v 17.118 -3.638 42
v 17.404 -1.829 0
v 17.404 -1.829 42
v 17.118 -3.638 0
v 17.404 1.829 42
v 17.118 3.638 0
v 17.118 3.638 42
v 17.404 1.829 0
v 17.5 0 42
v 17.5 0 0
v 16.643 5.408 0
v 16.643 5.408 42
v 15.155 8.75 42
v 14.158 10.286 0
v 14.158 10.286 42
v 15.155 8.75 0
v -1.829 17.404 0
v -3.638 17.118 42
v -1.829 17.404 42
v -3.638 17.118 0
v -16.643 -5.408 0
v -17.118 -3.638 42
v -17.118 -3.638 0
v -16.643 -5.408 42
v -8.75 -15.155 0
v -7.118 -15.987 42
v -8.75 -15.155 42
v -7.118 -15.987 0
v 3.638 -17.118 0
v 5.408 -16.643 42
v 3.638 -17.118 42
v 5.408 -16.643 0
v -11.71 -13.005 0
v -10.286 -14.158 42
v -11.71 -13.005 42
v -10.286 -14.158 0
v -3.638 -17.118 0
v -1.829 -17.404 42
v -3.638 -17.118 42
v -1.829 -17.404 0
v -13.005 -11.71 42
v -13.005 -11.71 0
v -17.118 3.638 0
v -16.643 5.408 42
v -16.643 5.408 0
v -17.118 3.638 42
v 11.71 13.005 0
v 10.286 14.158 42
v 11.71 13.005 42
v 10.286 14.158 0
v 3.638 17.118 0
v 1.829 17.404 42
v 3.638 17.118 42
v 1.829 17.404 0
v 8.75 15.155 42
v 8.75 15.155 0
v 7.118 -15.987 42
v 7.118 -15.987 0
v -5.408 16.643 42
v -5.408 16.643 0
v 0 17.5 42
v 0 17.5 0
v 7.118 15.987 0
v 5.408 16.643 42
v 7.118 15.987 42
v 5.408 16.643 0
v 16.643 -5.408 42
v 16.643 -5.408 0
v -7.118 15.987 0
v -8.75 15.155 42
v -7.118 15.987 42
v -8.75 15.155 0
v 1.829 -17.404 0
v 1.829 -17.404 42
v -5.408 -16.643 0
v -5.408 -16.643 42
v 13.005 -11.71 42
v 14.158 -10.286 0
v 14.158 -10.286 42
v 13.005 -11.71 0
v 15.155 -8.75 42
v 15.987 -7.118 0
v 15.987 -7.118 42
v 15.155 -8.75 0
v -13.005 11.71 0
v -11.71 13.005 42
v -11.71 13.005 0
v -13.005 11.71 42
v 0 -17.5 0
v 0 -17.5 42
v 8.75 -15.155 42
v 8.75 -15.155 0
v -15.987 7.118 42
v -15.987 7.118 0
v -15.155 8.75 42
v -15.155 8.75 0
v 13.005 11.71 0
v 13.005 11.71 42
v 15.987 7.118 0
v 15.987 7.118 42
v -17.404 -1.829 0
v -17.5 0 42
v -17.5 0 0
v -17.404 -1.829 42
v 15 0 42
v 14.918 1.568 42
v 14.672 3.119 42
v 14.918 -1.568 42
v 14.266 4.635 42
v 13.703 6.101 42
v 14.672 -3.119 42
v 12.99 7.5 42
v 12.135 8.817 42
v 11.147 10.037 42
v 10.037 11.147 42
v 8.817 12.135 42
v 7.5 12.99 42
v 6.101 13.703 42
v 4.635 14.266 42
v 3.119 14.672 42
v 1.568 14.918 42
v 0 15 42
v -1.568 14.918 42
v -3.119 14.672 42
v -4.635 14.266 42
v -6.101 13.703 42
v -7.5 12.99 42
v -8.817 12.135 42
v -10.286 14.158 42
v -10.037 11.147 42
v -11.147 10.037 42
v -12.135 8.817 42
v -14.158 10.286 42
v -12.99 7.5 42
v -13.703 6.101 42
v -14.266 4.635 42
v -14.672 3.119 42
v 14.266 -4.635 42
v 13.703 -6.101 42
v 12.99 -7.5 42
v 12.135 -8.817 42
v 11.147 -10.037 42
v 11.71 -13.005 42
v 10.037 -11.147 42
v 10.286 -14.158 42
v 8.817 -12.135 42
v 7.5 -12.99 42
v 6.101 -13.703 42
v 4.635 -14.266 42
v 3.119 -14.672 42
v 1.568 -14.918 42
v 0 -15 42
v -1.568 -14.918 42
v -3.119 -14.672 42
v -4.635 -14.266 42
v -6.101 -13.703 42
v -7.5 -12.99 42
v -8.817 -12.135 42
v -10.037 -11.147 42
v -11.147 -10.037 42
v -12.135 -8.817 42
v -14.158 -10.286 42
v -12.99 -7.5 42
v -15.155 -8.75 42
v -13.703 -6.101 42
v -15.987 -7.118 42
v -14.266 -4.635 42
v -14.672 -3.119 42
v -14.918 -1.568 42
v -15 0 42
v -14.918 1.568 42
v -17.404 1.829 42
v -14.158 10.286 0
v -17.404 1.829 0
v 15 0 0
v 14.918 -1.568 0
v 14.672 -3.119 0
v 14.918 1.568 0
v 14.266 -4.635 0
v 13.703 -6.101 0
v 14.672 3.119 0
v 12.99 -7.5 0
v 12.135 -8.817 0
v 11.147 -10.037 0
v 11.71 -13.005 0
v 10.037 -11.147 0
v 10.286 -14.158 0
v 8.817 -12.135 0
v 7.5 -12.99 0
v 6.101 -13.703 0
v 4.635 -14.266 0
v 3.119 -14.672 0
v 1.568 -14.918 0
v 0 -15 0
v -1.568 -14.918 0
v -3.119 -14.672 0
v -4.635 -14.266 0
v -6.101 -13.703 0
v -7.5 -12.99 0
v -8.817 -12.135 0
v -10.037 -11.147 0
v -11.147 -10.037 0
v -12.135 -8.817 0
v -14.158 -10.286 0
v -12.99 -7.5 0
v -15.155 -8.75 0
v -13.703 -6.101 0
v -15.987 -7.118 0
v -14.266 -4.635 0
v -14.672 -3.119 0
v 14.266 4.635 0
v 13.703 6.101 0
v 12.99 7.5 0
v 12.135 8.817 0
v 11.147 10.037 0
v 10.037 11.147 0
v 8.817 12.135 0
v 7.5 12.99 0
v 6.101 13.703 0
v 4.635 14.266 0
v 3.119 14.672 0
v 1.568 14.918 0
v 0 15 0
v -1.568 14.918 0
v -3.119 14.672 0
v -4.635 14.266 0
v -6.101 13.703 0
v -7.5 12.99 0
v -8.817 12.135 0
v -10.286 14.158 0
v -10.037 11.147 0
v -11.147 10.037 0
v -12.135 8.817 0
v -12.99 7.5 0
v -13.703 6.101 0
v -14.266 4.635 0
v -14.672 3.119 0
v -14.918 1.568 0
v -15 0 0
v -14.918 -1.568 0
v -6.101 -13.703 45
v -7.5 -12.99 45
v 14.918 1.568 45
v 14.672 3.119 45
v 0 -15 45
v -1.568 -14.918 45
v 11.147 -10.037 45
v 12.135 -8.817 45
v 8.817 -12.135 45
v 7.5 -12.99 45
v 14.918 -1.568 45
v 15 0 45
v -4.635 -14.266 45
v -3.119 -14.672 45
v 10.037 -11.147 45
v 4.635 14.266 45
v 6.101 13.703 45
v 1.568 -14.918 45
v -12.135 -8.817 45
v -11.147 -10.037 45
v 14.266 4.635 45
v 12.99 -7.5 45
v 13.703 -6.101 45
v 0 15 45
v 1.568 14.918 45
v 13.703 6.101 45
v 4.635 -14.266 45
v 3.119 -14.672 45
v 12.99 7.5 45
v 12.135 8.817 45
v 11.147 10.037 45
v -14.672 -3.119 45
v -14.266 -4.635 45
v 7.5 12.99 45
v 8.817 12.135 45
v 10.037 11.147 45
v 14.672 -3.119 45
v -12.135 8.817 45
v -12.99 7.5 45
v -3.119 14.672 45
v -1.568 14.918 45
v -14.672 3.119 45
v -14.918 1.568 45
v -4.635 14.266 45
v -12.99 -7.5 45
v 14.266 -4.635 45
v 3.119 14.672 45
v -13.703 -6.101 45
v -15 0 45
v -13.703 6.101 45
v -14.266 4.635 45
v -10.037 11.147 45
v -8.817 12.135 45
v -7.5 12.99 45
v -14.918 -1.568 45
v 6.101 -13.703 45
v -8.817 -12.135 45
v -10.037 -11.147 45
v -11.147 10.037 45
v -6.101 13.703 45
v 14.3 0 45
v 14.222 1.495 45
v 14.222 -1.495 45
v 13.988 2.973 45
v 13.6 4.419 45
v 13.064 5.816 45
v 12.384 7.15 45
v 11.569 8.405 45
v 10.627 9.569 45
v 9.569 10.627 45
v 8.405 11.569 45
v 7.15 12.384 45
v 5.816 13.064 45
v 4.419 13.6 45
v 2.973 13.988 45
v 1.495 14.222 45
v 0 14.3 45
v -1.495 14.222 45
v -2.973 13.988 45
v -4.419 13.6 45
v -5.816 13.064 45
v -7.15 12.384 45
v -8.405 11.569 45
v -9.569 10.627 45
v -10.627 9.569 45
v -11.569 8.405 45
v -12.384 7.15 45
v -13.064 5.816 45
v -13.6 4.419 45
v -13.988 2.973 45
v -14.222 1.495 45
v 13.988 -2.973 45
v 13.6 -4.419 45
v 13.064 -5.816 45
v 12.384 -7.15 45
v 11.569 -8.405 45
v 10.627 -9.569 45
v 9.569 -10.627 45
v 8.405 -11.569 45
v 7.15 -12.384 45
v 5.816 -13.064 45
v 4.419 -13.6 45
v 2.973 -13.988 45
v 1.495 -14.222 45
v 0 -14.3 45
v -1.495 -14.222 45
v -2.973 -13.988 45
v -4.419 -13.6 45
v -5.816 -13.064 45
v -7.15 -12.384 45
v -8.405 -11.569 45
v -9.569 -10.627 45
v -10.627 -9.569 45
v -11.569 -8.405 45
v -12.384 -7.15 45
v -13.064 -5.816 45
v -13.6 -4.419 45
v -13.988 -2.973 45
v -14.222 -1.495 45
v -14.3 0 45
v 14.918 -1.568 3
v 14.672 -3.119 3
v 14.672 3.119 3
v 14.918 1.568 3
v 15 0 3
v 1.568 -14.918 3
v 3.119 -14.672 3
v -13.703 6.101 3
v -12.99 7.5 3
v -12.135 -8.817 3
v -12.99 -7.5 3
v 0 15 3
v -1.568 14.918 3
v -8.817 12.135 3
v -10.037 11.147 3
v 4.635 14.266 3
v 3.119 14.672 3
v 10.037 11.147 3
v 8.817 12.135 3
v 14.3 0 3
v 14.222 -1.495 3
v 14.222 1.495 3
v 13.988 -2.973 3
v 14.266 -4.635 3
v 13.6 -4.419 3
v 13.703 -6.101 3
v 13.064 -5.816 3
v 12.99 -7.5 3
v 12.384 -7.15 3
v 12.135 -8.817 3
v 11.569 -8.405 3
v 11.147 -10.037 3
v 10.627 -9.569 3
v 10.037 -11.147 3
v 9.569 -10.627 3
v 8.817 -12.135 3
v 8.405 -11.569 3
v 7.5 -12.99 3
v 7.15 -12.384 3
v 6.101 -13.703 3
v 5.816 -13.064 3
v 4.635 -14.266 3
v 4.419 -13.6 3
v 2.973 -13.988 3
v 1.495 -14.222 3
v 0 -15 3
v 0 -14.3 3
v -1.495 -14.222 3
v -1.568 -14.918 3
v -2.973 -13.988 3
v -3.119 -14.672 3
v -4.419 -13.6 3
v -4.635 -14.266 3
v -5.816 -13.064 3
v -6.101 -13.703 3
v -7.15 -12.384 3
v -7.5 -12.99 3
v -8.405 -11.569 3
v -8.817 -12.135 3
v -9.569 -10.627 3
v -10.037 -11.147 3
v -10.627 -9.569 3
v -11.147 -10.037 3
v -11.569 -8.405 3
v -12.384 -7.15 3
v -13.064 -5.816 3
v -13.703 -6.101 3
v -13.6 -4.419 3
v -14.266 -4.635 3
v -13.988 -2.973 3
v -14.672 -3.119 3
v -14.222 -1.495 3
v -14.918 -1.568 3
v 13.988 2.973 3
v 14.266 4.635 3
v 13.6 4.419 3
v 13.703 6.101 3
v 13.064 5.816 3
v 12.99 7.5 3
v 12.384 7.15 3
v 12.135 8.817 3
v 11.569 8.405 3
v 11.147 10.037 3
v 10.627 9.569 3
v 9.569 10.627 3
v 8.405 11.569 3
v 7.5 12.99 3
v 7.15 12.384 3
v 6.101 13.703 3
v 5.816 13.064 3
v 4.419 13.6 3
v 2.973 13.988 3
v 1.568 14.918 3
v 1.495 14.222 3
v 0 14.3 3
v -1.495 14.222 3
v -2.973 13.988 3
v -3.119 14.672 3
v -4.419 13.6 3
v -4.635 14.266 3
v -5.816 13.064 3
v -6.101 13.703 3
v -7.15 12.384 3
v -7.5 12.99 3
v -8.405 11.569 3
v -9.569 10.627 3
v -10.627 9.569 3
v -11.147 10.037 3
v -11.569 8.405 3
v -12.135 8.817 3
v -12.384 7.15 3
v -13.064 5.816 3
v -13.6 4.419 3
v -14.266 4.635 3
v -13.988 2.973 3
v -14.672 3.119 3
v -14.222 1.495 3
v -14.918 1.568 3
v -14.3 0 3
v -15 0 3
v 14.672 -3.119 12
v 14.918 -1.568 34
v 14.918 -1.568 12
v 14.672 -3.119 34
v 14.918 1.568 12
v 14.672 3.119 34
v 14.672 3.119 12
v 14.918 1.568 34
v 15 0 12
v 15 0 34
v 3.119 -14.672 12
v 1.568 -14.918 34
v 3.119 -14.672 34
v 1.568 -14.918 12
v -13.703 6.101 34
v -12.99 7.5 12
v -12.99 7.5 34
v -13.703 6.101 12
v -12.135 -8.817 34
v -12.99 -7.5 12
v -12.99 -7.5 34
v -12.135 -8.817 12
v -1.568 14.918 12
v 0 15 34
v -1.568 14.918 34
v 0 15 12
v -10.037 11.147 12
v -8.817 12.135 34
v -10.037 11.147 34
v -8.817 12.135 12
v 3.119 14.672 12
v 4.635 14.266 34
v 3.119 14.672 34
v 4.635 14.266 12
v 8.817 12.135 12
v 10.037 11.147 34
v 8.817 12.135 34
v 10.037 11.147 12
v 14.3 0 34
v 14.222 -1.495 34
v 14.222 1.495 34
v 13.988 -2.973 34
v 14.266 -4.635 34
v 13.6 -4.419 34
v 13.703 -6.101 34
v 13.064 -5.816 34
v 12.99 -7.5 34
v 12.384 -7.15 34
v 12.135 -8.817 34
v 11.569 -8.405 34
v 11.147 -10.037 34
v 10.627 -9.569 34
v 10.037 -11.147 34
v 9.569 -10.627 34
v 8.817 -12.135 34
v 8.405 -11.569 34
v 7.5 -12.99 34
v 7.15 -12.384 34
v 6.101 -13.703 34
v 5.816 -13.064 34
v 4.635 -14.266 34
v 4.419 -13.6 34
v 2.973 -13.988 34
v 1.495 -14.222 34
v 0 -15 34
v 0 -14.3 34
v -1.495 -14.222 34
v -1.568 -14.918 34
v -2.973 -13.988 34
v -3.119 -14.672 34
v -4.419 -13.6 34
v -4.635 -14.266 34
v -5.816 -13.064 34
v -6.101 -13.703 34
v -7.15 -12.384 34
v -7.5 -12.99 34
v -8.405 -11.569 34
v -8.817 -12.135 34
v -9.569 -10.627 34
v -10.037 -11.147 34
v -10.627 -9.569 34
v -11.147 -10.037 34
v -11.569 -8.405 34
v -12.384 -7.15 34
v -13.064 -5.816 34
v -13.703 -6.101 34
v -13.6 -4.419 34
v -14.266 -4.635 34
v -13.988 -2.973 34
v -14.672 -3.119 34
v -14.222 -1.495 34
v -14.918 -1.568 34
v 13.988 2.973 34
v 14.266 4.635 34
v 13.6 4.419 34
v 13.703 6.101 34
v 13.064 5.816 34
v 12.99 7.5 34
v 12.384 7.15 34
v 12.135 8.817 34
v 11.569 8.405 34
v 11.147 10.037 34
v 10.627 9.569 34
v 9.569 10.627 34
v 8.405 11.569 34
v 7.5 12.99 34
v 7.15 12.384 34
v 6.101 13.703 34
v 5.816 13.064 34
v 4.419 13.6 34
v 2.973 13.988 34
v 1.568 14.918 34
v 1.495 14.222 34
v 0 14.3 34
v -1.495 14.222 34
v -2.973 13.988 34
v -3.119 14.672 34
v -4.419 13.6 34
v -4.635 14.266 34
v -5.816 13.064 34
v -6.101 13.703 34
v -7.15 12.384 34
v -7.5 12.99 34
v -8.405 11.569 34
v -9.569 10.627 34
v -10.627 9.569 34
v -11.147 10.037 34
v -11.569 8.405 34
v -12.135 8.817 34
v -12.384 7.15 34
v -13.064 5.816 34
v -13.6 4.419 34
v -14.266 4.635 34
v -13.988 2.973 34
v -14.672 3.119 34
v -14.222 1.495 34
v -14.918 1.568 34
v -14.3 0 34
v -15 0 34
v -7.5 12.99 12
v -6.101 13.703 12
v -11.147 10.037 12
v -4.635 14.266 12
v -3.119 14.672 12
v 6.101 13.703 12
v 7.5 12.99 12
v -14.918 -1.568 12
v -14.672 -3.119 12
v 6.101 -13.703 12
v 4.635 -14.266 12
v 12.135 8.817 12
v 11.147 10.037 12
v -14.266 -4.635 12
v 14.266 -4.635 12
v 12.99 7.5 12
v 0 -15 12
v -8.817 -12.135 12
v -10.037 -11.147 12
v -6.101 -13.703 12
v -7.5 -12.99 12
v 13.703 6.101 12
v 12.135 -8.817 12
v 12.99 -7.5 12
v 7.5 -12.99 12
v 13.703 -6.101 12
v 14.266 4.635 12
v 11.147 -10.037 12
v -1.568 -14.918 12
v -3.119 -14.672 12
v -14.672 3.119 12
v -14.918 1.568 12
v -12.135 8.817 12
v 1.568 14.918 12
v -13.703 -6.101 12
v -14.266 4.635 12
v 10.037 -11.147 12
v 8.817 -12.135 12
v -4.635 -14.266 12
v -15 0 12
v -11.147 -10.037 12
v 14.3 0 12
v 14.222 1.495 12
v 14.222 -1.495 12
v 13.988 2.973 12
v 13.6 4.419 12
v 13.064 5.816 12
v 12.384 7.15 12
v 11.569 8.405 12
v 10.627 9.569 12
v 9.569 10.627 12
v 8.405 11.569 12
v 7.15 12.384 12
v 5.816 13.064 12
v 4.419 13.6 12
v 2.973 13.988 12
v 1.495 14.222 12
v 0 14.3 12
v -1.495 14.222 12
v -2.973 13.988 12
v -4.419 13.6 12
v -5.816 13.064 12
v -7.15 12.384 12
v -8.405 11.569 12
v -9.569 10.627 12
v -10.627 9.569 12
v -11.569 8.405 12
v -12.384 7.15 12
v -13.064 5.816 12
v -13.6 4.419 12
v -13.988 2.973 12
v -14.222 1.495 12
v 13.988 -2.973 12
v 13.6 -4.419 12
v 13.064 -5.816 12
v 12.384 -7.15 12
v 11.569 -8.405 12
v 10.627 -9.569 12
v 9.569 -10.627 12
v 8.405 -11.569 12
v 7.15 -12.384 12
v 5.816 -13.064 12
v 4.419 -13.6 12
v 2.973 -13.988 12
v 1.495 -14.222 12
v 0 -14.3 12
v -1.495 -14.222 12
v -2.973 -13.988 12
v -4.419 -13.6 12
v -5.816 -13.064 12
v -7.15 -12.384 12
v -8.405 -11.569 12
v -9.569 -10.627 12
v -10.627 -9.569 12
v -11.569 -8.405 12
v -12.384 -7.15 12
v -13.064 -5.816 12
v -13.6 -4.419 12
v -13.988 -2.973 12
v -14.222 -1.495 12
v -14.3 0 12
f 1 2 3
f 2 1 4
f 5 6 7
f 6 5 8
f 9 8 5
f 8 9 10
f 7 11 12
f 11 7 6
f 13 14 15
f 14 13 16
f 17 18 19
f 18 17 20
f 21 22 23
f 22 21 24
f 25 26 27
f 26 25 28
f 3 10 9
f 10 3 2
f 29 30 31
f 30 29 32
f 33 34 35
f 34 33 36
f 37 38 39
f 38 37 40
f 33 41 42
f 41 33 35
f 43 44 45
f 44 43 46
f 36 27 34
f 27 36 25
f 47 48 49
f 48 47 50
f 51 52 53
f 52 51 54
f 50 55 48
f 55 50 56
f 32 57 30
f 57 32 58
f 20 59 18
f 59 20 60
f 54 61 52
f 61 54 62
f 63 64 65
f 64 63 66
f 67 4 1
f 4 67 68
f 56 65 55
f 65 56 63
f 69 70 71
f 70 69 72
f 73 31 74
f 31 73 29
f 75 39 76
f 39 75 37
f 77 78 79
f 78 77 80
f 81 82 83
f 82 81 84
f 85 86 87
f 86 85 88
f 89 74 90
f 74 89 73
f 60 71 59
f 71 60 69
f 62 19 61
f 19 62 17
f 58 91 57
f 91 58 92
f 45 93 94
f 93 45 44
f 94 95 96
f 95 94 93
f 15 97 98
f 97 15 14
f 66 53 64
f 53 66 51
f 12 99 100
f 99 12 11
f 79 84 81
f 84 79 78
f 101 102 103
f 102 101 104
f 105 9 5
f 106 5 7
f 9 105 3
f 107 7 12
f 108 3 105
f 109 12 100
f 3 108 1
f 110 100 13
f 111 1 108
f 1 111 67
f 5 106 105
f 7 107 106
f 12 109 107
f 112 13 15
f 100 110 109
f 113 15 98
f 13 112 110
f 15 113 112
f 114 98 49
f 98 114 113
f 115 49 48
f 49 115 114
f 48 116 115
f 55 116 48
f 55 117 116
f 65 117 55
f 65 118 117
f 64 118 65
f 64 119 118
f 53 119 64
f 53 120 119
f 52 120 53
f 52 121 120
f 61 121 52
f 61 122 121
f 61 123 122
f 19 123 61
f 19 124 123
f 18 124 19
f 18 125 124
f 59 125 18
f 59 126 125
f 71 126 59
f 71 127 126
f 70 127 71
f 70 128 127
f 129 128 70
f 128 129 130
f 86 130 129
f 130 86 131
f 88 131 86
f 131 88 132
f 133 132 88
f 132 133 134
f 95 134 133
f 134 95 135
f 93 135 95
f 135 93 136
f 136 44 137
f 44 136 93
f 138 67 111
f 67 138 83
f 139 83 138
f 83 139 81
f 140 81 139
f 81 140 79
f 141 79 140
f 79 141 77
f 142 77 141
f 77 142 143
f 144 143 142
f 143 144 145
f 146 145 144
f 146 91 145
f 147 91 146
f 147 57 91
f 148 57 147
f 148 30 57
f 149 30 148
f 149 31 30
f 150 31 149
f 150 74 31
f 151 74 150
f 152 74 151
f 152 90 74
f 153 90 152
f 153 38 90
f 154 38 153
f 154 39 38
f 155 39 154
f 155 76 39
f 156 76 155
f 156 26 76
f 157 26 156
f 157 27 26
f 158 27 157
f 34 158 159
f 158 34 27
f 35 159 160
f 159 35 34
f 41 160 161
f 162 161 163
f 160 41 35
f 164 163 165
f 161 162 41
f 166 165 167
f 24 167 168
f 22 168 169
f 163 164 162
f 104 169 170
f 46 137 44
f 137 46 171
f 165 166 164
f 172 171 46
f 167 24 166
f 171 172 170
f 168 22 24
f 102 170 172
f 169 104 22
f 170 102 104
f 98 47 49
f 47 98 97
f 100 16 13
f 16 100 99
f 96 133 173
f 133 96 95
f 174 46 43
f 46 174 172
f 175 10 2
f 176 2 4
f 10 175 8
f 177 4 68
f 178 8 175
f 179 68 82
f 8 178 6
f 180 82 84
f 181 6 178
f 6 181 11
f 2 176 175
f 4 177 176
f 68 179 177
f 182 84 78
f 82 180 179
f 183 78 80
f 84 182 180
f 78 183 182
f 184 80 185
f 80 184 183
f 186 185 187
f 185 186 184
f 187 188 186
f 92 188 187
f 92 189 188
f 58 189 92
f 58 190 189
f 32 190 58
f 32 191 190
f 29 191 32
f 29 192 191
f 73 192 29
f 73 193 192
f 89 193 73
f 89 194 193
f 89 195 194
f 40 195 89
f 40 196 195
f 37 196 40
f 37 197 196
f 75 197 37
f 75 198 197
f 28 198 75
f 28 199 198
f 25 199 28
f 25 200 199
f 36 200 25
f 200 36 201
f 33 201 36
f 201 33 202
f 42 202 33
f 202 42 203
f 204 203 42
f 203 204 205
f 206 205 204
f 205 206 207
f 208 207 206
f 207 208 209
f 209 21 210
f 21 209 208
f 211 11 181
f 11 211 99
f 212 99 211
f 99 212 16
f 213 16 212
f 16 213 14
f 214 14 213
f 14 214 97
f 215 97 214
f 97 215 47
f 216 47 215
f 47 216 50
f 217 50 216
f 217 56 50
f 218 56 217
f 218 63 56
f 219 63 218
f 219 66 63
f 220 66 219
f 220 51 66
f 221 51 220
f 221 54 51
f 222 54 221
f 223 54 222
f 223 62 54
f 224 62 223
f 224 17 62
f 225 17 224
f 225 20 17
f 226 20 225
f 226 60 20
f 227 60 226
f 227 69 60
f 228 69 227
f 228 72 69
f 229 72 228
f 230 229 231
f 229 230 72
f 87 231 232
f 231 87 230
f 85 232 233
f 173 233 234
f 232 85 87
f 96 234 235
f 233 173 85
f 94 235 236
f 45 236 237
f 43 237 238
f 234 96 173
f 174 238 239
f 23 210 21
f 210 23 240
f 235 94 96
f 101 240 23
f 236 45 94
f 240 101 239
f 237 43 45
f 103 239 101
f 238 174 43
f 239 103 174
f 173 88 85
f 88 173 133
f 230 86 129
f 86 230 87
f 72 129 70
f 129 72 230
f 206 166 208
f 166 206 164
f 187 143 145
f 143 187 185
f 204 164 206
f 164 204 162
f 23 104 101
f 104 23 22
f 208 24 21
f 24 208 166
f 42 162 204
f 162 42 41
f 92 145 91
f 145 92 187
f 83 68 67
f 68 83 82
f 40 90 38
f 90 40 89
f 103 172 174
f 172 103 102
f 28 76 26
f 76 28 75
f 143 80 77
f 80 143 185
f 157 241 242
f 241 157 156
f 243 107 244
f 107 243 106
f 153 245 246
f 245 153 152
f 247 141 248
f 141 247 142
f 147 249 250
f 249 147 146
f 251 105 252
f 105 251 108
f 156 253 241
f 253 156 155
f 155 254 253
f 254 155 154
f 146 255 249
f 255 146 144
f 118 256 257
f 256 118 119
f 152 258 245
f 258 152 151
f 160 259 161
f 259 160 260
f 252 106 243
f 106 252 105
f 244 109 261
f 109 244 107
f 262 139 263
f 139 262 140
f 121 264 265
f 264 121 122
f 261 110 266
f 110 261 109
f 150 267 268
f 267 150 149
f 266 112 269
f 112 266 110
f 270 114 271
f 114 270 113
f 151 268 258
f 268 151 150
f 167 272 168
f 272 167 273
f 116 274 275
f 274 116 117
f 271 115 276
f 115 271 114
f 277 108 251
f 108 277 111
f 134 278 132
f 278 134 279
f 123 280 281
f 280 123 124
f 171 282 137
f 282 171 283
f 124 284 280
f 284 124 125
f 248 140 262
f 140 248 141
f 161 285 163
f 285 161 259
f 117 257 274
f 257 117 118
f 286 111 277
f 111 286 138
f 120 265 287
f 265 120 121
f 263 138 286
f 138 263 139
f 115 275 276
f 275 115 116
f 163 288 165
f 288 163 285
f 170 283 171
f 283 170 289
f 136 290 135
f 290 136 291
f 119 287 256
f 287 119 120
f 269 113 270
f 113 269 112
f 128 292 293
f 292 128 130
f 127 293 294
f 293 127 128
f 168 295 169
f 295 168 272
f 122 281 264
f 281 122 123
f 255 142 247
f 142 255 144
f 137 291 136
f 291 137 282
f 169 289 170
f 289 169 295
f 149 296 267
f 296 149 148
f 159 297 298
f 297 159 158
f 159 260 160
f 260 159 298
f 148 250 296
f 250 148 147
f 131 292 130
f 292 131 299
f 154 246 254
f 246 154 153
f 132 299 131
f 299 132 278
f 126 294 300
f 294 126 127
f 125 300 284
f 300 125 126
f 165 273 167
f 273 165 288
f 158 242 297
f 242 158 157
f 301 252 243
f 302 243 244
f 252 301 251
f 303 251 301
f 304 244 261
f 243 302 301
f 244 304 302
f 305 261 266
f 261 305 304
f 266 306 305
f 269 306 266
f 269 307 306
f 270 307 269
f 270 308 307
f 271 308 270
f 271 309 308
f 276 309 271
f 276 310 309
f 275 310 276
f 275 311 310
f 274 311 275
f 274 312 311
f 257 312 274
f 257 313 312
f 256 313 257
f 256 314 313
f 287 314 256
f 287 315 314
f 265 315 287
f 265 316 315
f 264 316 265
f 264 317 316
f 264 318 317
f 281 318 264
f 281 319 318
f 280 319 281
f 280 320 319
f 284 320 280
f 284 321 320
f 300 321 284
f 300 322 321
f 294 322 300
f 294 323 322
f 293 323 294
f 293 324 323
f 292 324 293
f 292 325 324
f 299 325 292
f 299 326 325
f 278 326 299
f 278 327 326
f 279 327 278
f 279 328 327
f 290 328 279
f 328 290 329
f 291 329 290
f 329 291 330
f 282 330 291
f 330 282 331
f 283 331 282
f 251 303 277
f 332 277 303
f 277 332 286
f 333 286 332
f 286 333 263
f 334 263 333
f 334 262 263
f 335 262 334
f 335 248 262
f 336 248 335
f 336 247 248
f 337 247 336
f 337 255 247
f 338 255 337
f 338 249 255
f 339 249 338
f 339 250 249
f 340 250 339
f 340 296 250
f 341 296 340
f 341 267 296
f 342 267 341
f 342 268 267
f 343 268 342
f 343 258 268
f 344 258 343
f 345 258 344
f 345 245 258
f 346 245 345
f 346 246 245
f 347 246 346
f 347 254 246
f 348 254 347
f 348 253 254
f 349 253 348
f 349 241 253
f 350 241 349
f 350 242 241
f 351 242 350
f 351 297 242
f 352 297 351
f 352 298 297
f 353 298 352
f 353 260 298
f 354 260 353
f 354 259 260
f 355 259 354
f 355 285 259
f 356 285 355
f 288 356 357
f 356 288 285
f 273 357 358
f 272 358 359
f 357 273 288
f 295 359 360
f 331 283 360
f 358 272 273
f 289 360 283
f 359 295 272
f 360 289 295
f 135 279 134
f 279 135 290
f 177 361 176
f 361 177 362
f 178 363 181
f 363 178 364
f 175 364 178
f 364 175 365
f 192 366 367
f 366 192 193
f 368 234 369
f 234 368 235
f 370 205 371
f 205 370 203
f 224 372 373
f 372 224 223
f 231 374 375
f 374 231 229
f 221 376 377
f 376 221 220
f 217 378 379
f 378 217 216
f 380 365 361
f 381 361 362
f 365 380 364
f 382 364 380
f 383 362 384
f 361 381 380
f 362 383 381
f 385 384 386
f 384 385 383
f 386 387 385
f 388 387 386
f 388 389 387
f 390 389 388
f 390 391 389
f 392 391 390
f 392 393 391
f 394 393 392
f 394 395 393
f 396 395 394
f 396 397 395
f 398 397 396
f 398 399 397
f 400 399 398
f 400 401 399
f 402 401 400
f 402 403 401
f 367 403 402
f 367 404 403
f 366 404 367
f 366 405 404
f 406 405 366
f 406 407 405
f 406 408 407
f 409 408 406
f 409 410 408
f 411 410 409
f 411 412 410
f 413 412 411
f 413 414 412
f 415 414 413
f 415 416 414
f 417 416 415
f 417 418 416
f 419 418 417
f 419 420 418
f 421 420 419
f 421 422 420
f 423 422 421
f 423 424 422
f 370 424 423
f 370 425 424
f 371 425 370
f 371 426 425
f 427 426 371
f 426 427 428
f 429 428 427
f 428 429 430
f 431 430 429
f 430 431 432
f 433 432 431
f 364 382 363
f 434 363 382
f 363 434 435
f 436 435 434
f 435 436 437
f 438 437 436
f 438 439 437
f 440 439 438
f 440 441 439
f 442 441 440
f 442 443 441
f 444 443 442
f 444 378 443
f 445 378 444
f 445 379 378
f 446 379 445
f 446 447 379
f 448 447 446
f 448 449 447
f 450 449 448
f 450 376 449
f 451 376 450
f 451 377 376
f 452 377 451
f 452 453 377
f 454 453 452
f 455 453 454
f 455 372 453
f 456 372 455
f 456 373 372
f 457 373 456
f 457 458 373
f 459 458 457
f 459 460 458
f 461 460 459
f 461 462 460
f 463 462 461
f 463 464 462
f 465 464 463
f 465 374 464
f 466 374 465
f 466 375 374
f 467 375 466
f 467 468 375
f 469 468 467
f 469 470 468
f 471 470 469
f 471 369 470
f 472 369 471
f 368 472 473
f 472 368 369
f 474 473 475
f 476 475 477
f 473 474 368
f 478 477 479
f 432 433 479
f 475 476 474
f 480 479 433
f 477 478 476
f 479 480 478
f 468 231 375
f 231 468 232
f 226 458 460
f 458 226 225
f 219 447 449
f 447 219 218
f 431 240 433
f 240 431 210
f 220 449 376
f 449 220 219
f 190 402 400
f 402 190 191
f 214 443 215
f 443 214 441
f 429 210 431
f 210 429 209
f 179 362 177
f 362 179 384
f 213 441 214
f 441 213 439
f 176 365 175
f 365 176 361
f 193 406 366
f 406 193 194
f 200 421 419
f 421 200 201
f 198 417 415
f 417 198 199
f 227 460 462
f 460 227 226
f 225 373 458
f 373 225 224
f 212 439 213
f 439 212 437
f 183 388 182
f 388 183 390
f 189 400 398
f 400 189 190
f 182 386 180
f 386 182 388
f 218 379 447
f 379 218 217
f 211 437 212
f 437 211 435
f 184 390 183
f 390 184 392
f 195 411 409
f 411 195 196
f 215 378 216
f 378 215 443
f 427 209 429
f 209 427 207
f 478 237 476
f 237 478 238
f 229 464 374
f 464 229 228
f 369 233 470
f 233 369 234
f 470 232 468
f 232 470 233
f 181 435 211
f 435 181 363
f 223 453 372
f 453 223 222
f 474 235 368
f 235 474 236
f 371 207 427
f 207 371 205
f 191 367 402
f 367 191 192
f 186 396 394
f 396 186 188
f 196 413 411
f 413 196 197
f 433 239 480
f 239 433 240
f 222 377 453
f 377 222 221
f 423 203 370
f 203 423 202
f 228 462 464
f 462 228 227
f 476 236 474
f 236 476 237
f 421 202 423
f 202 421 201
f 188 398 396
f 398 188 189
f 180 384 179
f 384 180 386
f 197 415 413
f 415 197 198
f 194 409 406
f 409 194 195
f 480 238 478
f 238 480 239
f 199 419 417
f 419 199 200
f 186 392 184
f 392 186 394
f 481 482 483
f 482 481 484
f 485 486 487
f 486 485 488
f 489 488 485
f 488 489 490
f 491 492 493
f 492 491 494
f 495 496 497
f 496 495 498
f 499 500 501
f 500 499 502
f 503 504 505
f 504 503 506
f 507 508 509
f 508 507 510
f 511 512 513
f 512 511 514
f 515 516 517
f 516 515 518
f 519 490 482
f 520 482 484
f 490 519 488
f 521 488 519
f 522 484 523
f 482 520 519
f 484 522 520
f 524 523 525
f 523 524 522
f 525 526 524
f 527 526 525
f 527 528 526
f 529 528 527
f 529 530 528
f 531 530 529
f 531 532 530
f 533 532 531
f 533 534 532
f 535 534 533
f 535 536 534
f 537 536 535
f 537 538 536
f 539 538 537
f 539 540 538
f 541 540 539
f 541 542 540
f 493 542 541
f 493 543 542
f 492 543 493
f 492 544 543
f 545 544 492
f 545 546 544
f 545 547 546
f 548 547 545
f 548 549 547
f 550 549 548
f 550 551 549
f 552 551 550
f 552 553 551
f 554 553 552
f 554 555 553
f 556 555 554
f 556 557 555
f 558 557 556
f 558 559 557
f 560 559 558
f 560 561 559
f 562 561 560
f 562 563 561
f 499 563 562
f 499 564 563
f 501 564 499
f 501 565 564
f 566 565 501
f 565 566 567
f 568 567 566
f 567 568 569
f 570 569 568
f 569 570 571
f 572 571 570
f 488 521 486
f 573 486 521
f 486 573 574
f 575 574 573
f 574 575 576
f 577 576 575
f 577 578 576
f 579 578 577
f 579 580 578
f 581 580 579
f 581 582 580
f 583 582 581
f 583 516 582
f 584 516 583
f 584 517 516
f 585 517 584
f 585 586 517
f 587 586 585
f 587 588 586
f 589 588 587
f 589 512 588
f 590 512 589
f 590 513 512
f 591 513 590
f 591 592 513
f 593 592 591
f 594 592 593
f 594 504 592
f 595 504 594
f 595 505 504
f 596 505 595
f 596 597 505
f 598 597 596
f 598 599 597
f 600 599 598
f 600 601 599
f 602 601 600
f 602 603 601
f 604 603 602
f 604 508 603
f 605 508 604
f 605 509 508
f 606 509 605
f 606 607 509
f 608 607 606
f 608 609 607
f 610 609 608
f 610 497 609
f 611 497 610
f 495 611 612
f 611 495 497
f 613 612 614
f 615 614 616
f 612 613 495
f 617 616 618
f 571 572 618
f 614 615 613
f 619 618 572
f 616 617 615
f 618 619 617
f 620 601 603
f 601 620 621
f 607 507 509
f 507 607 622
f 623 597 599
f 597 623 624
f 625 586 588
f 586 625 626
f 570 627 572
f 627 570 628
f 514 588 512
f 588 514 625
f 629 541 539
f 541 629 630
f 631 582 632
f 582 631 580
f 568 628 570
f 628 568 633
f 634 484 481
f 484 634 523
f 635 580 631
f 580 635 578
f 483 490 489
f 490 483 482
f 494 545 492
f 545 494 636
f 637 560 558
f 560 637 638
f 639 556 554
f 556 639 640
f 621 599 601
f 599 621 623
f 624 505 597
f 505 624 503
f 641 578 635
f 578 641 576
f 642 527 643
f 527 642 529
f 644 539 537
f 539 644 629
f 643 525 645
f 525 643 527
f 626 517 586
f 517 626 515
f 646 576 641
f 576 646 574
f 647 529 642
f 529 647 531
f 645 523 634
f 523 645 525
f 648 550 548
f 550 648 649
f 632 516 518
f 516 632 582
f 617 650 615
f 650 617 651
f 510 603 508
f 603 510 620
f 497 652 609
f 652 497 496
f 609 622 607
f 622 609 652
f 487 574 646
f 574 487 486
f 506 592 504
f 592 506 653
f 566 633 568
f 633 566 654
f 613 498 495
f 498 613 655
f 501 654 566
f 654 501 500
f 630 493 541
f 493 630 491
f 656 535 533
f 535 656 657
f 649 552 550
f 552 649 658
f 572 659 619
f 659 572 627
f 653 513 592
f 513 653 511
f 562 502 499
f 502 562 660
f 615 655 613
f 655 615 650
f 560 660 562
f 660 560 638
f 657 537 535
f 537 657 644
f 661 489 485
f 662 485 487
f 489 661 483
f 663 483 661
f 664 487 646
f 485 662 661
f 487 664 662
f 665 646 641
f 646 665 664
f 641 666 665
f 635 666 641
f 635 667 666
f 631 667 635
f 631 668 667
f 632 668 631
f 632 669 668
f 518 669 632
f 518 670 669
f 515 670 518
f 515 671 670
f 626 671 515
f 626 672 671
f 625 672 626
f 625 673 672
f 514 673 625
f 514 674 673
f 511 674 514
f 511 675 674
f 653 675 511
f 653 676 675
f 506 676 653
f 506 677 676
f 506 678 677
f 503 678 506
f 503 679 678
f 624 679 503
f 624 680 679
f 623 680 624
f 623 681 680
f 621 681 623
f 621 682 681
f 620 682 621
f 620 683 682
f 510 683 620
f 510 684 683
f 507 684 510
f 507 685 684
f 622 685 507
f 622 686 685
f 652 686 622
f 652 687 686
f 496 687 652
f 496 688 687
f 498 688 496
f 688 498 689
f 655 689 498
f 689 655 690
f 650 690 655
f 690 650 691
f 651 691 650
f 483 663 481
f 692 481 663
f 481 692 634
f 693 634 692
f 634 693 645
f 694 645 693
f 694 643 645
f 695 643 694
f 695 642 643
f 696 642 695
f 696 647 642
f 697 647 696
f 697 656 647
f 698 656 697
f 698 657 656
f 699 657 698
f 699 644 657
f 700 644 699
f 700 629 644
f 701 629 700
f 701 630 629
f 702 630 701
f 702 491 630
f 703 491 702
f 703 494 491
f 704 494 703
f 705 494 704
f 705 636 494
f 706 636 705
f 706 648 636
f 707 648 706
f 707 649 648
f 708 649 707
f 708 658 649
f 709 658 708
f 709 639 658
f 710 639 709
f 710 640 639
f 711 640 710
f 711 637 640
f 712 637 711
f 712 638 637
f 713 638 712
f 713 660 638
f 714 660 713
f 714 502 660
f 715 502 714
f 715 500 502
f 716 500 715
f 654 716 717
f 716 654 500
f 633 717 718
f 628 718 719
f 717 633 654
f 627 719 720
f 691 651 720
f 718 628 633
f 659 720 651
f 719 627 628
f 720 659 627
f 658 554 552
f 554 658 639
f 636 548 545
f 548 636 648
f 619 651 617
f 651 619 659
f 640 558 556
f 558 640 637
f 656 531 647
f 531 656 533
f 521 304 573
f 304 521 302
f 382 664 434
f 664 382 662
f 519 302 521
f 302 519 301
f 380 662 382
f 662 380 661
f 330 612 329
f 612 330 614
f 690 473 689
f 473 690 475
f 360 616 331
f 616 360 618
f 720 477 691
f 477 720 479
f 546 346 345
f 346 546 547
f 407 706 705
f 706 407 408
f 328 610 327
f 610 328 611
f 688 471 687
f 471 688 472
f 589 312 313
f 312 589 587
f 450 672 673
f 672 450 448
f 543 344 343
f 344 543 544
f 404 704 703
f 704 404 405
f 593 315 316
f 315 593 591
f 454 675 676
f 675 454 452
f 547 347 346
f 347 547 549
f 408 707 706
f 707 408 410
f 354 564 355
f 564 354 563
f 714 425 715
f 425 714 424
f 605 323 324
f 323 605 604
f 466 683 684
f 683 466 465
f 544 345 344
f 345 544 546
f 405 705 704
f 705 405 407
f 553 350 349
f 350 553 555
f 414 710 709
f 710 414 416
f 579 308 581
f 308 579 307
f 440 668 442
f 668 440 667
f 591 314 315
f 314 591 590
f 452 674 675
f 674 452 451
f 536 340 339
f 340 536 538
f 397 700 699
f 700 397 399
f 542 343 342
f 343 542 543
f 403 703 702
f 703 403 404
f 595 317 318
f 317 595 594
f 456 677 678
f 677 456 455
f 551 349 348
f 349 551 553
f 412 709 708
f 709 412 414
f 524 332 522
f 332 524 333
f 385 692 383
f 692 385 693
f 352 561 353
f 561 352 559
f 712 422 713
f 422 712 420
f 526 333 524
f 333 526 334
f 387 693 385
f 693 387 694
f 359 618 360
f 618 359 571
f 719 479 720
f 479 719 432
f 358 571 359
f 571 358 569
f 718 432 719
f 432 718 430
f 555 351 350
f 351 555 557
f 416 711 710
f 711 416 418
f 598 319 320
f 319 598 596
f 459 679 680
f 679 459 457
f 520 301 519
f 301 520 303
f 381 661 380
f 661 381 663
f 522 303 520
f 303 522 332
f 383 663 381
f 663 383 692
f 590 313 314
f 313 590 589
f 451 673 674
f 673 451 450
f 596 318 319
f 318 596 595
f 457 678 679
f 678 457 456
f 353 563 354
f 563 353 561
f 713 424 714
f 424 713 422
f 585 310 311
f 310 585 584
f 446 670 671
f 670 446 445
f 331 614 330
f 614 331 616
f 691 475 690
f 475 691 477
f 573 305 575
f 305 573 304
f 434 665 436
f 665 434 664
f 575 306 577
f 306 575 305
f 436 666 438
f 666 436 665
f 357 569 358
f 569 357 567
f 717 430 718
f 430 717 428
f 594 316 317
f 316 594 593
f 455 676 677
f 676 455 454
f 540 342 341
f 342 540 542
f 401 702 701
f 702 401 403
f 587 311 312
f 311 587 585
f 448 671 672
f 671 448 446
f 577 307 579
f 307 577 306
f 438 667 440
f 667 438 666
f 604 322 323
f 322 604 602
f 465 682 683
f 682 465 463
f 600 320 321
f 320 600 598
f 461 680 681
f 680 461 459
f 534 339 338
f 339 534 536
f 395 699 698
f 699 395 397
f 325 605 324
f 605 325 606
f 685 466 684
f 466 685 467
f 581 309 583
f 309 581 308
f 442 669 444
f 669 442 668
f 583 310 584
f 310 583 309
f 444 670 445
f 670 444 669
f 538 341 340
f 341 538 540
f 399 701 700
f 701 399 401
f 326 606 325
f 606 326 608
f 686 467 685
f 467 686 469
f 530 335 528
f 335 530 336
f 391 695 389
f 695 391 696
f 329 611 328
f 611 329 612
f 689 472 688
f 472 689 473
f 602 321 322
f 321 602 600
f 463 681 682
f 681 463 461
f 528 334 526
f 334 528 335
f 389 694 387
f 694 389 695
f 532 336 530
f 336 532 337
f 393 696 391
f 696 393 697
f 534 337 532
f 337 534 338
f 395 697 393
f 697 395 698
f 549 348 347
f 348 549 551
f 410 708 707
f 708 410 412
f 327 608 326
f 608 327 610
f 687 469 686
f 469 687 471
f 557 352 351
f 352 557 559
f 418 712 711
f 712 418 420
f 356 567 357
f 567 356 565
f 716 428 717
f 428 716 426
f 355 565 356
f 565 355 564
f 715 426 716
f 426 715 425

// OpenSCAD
$fn = 60;

height = 40;

//rotate([-90,0,0]) 
difference(){
    union(){
        cylinder(r=17.5,h = height + 2);
        cylinder(r=15,h = height + 5);
    }
    translate([0,0,-1]) cylinder(r=15,h = 4);
    translate([0,0,12]) cylinder(r=15,h = height - 18);
    cylinder(r=14.3,h = height + 6);
}
